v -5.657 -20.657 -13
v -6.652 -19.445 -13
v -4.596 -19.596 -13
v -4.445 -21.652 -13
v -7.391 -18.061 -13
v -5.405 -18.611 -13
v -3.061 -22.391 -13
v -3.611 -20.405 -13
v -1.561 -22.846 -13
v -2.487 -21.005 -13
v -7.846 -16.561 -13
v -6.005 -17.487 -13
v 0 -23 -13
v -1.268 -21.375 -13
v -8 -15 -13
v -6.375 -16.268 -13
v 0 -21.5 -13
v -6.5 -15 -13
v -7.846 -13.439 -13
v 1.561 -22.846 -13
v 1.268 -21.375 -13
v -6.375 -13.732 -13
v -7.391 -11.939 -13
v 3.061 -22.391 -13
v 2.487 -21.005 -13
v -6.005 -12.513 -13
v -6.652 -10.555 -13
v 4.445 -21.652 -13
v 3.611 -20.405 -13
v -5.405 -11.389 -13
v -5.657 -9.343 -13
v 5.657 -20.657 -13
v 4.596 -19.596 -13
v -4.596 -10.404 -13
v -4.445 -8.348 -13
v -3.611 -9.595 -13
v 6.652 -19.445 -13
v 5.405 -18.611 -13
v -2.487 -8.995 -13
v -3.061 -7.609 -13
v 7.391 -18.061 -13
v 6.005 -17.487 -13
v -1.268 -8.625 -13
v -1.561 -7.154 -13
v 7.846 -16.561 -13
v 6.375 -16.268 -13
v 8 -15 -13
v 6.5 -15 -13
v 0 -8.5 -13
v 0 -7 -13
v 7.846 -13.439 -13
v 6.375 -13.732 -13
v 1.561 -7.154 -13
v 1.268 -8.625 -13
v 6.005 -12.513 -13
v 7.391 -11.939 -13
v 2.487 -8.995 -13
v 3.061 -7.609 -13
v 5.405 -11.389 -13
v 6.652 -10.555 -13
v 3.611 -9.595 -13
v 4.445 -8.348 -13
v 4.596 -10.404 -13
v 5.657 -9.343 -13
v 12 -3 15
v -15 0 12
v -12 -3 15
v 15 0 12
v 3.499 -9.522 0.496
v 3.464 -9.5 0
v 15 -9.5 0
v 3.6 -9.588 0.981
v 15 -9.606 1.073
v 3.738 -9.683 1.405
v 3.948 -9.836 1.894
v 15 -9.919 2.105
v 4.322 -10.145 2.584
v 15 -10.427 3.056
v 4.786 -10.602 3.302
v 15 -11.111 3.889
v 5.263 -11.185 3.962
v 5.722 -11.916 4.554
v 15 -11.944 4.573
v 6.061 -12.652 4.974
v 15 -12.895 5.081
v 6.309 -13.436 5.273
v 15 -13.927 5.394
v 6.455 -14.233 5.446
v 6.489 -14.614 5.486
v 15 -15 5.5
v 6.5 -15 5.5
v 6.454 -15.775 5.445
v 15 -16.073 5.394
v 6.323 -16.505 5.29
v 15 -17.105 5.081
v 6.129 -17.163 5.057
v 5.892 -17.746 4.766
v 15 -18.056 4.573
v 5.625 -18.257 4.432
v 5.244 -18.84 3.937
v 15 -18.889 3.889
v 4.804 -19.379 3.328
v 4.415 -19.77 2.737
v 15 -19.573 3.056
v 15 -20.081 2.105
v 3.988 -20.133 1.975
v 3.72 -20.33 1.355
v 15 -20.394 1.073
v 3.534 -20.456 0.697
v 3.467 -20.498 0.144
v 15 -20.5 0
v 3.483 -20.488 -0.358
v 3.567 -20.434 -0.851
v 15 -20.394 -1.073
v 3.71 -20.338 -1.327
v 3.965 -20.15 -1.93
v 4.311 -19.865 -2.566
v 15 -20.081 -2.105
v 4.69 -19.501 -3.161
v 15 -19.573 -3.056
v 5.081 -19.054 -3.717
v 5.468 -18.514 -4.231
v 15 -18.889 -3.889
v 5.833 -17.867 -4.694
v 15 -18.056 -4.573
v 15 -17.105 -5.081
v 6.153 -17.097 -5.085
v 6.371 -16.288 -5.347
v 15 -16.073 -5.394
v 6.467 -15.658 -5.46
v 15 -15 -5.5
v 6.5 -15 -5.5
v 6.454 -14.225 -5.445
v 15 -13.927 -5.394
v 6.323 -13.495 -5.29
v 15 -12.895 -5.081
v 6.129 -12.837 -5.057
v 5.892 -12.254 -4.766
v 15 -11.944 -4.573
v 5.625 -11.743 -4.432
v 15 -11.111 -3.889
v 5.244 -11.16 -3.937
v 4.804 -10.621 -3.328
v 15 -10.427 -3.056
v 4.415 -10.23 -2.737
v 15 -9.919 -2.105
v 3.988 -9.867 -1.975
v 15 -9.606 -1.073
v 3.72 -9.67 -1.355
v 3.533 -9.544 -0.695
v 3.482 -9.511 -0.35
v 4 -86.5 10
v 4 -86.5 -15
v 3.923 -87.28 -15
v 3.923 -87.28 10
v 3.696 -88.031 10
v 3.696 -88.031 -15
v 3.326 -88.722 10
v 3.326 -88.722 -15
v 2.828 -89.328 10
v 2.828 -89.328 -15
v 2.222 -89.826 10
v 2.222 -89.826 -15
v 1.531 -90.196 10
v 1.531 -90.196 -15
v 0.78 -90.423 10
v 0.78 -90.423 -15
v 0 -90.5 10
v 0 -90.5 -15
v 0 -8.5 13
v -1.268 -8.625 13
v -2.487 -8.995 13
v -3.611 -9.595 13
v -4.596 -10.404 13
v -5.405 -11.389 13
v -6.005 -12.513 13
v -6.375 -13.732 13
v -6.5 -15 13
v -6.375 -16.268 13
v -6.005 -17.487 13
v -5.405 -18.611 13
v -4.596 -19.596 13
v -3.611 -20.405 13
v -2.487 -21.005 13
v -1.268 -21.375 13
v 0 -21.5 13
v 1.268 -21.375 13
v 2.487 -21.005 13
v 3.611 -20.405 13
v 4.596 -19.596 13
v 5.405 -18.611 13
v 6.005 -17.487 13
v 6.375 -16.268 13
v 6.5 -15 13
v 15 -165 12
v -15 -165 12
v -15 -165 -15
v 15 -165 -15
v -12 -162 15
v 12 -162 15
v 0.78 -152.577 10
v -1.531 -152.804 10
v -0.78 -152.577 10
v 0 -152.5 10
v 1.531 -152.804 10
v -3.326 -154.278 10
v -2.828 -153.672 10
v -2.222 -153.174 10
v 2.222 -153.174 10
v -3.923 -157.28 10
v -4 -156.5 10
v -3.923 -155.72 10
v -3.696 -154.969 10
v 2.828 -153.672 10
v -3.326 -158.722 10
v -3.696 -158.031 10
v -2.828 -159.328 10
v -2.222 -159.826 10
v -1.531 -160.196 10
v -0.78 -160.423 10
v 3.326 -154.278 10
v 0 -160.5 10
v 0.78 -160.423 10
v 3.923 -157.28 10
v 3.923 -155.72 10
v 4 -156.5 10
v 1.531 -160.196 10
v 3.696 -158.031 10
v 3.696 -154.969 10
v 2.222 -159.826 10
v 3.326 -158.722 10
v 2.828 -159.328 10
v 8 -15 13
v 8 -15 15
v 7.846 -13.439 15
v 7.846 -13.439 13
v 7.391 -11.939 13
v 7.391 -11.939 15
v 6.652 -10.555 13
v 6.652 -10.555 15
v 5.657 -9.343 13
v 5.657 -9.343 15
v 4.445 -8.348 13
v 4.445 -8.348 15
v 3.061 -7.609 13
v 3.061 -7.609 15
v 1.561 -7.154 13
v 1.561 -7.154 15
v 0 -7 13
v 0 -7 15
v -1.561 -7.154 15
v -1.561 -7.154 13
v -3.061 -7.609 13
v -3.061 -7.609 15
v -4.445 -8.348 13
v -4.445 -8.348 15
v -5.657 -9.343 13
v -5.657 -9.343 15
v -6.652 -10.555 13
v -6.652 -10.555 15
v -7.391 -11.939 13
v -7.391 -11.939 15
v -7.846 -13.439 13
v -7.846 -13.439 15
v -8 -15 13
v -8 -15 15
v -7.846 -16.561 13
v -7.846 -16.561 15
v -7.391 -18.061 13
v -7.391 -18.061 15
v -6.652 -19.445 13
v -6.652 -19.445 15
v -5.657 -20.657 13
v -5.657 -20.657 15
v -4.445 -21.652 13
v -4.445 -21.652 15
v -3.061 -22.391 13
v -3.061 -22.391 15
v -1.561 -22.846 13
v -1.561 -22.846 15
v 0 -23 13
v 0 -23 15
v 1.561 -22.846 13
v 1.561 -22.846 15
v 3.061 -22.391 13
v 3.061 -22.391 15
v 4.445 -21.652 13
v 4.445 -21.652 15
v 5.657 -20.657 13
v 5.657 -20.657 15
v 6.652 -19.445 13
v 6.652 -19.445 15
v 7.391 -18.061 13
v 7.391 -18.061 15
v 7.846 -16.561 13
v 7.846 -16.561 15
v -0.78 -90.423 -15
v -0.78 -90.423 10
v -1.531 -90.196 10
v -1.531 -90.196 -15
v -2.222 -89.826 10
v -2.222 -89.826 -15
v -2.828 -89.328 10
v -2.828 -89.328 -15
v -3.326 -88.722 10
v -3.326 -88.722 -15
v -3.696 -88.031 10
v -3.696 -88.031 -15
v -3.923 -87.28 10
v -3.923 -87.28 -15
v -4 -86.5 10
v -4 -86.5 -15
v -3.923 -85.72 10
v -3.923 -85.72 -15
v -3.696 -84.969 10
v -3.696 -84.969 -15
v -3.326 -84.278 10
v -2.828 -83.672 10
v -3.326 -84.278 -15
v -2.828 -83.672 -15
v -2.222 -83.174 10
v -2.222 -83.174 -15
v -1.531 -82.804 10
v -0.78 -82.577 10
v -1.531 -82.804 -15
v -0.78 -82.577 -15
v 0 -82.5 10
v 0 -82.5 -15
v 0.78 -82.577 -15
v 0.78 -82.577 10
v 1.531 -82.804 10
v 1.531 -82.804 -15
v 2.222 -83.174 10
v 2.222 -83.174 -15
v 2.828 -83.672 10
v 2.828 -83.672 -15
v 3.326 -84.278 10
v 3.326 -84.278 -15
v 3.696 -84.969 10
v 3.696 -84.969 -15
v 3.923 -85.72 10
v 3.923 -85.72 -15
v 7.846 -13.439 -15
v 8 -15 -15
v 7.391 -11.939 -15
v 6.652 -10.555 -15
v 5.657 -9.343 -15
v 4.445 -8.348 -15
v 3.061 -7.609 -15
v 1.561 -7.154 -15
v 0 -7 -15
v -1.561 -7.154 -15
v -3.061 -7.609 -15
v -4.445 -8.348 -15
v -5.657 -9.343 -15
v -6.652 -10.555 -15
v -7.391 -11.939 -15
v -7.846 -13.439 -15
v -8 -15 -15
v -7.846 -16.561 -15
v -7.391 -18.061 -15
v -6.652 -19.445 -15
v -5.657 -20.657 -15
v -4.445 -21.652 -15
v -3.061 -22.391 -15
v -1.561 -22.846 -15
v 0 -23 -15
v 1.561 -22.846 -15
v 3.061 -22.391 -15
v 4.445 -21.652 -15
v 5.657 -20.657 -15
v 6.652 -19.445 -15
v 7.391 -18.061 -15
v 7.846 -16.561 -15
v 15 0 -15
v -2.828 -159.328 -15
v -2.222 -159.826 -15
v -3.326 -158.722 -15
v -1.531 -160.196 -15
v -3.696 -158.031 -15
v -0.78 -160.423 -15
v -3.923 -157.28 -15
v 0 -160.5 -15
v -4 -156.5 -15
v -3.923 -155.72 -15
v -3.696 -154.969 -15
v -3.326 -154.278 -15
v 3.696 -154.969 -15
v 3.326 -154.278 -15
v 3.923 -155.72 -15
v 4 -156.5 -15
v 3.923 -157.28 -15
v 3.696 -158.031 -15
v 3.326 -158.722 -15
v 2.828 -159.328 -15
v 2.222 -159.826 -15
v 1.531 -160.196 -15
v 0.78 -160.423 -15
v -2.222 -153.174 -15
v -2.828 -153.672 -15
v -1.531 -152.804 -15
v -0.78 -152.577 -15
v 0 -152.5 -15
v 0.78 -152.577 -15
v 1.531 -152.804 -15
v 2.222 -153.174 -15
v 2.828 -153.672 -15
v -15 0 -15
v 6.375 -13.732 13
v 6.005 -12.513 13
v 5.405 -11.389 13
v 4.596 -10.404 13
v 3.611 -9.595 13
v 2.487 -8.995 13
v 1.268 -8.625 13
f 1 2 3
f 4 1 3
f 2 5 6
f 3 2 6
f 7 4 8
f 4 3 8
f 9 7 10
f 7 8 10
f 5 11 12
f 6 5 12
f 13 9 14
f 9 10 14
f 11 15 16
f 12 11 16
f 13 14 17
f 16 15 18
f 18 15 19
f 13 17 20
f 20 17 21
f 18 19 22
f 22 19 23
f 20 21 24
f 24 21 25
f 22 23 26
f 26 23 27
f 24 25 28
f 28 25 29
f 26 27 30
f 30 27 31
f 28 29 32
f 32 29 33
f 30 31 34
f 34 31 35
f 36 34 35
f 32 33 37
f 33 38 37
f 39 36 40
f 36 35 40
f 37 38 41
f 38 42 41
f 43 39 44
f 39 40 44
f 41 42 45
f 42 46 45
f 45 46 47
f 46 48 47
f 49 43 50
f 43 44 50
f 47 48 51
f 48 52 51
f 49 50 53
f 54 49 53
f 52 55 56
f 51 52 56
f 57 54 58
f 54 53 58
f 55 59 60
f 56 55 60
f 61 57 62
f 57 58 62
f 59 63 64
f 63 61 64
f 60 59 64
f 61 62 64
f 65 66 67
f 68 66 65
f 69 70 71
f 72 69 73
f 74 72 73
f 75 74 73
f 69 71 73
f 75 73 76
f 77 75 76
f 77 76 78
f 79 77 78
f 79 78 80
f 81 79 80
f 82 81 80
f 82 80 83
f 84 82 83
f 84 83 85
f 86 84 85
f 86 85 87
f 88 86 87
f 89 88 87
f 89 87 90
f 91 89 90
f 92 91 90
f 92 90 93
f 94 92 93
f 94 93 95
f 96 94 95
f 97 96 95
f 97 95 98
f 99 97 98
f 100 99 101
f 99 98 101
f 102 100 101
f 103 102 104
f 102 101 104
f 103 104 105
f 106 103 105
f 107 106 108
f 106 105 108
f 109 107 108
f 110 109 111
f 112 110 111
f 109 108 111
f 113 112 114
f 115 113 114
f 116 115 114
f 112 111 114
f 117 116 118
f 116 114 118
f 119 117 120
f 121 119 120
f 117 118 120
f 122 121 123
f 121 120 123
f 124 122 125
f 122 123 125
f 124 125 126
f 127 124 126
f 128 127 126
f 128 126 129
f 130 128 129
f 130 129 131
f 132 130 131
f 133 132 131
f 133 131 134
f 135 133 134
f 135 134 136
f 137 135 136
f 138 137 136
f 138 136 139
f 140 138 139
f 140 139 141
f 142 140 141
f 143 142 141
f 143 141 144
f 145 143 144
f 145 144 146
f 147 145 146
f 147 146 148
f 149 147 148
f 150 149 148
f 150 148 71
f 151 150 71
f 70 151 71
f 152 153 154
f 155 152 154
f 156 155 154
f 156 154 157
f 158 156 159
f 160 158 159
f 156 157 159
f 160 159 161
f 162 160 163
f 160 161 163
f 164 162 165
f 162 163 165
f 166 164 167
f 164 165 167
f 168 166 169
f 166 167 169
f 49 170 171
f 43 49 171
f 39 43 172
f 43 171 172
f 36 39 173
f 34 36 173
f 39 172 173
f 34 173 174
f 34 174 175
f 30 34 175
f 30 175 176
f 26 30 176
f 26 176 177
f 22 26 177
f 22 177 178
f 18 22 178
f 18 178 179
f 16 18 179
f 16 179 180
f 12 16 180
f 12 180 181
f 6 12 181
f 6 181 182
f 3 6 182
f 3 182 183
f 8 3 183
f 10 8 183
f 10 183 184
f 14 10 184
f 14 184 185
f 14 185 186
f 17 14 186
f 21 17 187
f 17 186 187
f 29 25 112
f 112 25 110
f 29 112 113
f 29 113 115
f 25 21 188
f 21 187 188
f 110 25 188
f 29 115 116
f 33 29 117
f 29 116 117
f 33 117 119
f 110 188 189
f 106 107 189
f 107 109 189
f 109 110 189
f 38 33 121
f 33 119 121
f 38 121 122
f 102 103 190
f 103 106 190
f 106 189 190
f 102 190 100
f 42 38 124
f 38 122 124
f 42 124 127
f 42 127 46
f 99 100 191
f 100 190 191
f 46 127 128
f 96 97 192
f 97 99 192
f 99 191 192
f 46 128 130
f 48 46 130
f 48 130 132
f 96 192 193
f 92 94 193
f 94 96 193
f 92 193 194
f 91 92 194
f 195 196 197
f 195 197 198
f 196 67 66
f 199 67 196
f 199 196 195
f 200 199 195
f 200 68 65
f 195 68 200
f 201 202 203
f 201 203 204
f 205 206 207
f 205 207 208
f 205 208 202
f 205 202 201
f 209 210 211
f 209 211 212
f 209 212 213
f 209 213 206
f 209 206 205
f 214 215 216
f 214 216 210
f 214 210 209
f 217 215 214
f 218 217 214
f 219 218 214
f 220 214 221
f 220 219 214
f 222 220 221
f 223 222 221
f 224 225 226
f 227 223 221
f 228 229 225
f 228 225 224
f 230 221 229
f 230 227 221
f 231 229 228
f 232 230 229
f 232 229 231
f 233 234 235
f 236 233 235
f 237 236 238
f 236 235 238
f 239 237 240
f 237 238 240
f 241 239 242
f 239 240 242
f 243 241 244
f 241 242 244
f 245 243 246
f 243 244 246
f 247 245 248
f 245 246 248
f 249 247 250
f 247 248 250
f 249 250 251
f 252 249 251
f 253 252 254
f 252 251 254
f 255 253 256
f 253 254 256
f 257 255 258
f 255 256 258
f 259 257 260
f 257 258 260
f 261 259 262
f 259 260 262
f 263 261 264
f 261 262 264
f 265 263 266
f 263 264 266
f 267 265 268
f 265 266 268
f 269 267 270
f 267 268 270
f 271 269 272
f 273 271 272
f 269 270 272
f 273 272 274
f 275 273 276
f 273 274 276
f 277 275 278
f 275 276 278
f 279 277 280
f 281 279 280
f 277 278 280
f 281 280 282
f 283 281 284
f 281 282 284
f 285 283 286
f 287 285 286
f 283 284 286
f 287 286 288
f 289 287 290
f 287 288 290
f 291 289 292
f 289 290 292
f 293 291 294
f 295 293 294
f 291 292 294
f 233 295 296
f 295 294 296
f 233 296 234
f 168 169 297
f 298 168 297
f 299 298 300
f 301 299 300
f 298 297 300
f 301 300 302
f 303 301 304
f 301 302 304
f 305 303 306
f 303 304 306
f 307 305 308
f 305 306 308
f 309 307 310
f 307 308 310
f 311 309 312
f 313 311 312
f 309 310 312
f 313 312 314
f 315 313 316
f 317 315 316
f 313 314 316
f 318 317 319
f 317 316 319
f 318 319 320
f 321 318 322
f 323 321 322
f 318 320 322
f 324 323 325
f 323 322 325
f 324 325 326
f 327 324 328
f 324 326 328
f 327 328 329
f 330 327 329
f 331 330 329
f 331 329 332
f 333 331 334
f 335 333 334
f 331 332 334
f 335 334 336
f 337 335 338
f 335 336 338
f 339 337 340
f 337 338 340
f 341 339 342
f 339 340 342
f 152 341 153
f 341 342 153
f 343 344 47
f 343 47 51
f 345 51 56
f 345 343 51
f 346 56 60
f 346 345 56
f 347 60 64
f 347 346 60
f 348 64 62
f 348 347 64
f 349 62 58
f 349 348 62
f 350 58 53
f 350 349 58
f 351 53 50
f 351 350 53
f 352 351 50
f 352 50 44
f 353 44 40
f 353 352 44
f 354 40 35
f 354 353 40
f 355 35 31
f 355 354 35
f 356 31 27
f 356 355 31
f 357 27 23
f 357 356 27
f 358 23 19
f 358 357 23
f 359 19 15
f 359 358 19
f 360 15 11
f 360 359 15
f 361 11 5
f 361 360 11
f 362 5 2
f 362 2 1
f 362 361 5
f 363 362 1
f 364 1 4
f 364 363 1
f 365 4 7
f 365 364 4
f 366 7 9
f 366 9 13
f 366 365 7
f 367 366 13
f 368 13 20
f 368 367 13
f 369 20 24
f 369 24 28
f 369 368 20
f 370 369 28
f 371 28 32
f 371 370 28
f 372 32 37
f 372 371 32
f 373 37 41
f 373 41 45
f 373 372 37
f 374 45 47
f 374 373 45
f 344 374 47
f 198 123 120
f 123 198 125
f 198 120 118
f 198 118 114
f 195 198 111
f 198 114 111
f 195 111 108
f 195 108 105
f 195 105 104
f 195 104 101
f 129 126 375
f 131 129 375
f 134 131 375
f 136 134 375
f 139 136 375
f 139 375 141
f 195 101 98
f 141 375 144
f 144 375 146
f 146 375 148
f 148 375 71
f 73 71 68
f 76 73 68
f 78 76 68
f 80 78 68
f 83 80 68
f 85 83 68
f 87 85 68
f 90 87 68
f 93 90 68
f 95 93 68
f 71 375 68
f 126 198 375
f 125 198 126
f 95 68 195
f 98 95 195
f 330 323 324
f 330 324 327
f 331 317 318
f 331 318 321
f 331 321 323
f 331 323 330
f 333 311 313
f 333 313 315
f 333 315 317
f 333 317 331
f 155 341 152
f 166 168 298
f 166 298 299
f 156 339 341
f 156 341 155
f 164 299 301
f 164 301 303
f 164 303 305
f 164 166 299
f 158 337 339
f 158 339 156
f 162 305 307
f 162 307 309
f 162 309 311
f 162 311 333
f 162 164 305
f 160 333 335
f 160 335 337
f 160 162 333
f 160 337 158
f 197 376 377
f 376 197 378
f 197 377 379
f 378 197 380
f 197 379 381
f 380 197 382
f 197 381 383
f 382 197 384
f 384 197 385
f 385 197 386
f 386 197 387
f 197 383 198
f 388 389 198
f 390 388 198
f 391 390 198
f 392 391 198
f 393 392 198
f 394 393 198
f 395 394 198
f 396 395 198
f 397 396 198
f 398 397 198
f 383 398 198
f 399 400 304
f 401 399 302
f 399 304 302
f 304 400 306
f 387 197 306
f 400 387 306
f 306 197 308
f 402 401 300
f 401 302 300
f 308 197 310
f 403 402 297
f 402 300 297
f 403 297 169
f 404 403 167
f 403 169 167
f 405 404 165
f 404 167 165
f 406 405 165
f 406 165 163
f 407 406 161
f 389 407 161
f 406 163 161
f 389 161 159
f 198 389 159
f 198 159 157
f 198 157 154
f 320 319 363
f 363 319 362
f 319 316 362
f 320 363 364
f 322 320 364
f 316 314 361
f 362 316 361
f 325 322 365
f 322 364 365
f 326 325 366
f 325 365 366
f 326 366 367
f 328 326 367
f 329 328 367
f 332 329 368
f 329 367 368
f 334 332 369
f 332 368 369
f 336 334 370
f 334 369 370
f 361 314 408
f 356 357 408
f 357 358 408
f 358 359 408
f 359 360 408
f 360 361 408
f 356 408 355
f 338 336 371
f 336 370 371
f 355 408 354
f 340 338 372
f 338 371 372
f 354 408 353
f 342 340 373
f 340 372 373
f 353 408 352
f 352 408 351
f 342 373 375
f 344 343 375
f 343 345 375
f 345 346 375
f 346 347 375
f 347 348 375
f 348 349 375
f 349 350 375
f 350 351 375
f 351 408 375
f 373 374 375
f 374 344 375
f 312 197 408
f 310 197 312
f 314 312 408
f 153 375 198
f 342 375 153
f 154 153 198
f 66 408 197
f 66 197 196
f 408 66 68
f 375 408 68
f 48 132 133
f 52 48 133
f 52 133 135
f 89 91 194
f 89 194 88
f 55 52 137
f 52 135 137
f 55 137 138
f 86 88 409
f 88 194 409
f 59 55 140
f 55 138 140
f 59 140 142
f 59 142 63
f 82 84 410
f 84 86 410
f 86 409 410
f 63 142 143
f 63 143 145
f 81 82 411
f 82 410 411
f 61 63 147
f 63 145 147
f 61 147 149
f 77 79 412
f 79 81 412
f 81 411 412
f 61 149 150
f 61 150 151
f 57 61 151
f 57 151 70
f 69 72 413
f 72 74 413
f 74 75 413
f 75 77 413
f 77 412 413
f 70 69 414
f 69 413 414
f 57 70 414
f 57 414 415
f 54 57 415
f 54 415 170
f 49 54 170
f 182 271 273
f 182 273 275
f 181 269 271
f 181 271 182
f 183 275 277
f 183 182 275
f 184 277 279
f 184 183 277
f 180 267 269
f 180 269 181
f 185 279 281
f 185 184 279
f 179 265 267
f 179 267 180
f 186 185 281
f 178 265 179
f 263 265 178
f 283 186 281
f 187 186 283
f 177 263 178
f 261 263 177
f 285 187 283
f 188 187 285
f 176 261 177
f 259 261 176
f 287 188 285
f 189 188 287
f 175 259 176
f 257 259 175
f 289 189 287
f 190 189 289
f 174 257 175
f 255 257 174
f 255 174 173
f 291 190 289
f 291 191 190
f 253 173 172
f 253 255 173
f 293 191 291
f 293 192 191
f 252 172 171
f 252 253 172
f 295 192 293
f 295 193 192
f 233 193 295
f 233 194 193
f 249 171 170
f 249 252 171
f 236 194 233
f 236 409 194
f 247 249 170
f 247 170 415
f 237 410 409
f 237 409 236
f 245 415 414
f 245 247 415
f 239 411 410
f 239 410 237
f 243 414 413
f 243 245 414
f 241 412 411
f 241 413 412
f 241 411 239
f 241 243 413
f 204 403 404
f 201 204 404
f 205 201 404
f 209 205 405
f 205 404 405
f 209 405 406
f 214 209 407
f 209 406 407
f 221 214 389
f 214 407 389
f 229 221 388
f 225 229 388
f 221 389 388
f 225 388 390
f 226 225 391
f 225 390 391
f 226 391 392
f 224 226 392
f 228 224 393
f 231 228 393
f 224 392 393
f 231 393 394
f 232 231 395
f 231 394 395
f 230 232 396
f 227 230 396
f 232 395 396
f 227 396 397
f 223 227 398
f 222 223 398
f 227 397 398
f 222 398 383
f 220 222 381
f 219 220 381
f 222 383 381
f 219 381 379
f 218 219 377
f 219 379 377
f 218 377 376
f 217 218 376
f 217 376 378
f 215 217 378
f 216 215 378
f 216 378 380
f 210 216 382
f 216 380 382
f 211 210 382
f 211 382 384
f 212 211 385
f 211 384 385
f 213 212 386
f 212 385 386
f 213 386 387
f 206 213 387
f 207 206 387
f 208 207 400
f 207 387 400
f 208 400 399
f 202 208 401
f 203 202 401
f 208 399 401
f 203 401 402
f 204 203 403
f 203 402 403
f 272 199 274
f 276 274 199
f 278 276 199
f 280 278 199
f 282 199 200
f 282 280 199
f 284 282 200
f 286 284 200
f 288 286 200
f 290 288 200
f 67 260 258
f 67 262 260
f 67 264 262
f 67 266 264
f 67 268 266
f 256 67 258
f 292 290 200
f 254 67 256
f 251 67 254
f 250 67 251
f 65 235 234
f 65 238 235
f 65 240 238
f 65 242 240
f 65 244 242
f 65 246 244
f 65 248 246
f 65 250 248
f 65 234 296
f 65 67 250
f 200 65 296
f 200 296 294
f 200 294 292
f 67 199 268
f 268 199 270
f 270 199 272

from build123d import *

# Parameters (mm, degrees)
F0_W      = 30
F0_H      = 30
F1_DEPTH  = 165
F3_DEPTH  = 30
F4_R      = 5.5
F5_DEPTH  = 12.3
F6_R      = 8
F6_R_2    = 6.5
F7_DEPTH  = 2
F8_SIZE   = 3
F10_DEPTH = 25


# Not quite as in the source:
# - a pattern or mirror of a feature is missing from the dataset's text; its kind, count and spacing are read off the source's solid


with BuildPart() as f1:
    # F0 (on Front) → F1 (new body)
    with BuildSketch(Plane.XZ):
        Rectangle(F0_W, F0_H)
    extrude(amount=F1_DEPTH)

    # F2 (on face) → F3 (cut)
    with BuildSketch(Plane.XY.offset(15)):
        with BuildLine():
            ThreePointArc((0, -8.5), (-4.5961940777, -19.5961940777), (6.5, -15))
            ThreePointArc((6.5, -15), (4.5961940777, -10.4038059223), (0, -8.5))
        make_face()
    extrude(amount=-F3_DEPTH, mode=Mode.SUBTRACT)

    # F4 (on face) → F5 (cut)
    with BuildSketch(Plane.YZ.offset(15)):
        with Locations((-15, 0)):
            Circle(F4_R)
    extrude(amount=-F5_DEPTH, mode=Mode.SUBTRACT)

    # F6 (on face) → F7 (cut)
    with BuildSketch(Plane.XY.offset(15)):
        with Locations((0, -15)):
            Circle(F6_R)
        with Locations((0, -15)):
            Circle(F6_R_2, mode=Mode.SUBTRACT)
        with Locations((0, -15)):
            Circle(F6_R_2)
    f7 = extrude(amount=-F7_DEPTH, mode=Mode.SUBTRACT)

    # F7_copies: F7 across plane
    add(f7.mirror(Plane(origin=(0, 0, 0), x_dir=(-1, 0, 0), z_dir=(0, 0, -1))), mode=Mode.SUBTRACT)

    # F8
    f8_edges = [f1.edges().sort_by_distance(p)[0] for p in [
        (15, -82.5, 15),
        (0, 0, 15),
        (-15, -82.5, 15),
        (0, -165, 15),
    ]]
    chamfer(f8_edges, length=F8_SIZE)

    # F9 (on face) → F10 (cut)
    with BuildSketch(Plane(origin=(0, 0, -15), x_dir=(1, 0, 0), z_dir=(0, 0, -1))):
        with BuildLine():
            ThreePointArc((0, 90.5), (-4, 86.5), (0, 82.5))
            Line((0, 82.5), (0, 86.5))
            Line((0, 86.5), (0, 90.5))
        make_face()
        with BuildLine():
            Line((0, 86.5), (0, 82.5))
            ThreePointArc((0, 82.5), (2.8284271247, 83.6715728753), (4, 86.5))
            ThreePointArc((4, 86.5), (2.8284271247, 89.3284271247), (0, 90.5))
            Line((0, 90.5), (0, 86.5))
        make_face()
        with BuildLine():
            ThreePointArc((4, 156.5), (-2.8284271247, 159.3284271247), (0, 152.5))
            ThreePointArc((0, 152.5), (2.8284271247, 153.6715728753), (4, 156.5))
        make_face()
    extrude(amount=-F10_DEPTH, mode=Mode.SUBTRACT)


solid = f1.part
